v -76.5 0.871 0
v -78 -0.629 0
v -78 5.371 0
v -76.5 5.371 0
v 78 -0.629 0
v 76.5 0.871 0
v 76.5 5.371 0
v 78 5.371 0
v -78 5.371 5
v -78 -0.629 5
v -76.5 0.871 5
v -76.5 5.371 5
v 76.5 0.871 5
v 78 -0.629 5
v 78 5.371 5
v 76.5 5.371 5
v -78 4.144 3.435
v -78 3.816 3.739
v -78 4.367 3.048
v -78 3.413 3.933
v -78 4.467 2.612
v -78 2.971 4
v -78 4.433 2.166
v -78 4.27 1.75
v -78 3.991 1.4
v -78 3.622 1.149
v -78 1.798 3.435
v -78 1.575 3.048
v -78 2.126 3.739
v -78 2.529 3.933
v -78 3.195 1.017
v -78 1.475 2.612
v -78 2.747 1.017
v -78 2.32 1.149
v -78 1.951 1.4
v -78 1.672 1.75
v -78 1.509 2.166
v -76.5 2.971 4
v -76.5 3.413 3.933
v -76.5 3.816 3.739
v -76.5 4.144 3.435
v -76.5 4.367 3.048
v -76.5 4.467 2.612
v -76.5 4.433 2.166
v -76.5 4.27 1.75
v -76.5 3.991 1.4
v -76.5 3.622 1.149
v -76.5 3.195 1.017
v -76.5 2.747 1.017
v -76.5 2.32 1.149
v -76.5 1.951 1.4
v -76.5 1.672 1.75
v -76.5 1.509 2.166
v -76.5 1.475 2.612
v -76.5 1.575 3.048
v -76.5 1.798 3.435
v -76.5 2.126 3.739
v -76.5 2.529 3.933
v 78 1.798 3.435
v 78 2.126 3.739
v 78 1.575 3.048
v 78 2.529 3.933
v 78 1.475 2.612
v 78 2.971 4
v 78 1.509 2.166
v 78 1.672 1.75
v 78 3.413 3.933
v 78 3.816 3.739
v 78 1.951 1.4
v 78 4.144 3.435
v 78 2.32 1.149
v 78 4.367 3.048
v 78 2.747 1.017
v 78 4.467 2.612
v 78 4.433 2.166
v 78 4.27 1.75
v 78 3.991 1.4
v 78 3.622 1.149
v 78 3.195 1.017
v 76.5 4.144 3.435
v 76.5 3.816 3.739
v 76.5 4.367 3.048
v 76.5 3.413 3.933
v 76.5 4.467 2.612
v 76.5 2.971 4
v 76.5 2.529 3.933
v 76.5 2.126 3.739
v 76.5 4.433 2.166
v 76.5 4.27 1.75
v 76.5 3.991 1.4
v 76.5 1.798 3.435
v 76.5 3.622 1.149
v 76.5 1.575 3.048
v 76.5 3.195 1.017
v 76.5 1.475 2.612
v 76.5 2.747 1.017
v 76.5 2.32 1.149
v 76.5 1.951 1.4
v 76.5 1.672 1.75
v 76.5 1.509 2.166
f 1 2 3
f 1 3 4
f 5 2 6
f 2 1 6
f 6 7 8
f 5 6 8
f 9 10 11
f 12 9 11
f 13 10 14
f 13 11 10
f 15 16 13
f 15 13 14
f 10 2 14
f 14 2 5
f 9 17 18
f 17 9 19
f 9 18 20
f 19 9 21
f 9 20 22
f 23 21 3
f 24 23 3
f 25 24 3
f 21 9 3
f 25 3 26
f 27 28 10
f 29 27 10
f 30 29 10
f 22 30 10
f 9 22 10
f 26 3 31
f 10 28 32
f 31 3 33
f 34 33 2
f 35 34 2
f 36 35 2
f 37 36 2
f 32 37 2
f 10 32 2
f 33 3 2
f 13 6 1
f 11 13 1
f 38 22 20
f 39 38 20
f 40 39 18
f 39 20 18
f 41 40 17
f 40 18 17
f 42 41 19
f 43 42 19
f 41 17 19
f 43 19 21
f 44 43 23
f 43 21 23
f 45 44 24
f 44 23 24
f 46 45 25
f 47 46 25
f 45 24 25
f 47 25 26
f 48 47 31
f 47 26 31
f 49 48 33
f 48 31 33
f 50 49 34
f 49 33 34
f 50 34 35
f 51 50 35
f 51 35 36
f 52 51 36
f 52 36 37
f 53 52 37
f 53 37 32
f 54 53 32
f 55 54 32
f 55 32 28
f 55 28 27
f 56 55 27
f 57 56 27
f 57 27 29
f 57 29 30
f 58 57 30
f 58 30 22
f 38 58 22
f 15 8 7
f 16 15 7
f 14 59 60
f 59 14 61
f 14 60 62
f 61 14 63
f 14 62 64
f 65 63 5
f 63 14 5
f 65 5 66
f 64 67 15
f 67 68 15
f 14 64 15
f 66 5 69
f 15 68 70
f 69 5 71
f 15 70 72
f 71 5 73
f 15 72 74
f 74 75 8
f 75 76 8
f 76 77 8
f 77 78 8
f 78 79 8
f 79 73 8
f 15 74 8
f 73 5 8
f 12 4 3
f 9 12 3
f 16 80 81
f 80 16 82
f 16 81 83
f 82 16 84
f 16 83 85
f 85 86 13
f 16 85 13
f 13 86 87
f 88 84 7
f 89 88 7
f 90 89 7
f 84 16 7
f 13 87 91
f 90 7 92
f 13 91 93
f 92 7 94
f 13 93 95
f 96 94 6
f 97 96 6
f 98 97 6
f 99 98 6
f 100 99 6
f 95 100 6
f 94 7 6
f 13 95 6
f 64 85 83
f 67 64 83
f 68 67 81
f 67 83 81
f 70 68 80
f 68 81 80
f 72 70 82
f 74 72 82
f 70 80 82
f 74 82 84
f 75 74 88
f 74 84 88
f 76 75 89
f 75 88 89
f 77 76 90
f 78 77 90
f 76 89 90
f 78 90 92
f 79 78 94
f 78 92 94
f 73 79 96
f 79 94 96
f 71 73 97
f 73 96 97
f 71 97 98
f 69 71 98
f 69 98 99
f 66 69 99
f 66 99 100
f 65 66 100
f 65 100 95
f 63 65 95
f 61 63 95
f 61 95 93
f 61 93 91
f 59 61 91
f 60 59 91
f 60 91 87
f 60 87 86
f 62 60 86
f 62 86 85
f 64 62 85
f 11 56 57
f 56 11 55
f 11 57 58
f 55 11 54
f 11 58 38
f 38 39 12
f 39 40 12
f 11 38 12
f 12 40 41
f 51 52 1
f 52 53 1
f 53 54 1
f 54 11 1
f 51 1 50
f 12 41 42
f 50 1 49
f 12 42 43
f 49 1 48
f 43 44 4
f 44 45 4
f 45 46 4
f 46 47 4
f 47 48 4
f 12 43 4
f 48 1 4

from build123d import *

# Parameters (mm, degrees)
EXTRUDE_1_DEPTH     = 5
SKETCH_2_R          = 1.5
CUT_EXTRUDE_1_DEPTH = 318


with BuildPart() as part:
    # 草图1 → 凸台-拉伸1 (new body)
    with BuildSketch(Plane.XY):
        Polygon((78, 5.370967742), (76.5, 5.370967742), (76.5, 0.870967742), (-76.5, 0.870967742), (-76.5, 5.370967742), (-78, 5.370967742), (-78, 0.629032258), (-78, -0.629032258), (78, -0.629032258), (78, 0.629032258), align=None)
    extrude(amount=EXTRUDE_1_DEPTH)

    # 草图2 → 切除-拉伸1 (cut)
    with BuildSketch(Plane.ZY.offset(78)):
        with Locations((2.5, 2.970967742)):
            Circle(SKETCH_2_R)
    extrude(amount=-CUT_EXTRUDE_1_DEPTH, mode=Mode.SUBTRACT)


solid = part.part
